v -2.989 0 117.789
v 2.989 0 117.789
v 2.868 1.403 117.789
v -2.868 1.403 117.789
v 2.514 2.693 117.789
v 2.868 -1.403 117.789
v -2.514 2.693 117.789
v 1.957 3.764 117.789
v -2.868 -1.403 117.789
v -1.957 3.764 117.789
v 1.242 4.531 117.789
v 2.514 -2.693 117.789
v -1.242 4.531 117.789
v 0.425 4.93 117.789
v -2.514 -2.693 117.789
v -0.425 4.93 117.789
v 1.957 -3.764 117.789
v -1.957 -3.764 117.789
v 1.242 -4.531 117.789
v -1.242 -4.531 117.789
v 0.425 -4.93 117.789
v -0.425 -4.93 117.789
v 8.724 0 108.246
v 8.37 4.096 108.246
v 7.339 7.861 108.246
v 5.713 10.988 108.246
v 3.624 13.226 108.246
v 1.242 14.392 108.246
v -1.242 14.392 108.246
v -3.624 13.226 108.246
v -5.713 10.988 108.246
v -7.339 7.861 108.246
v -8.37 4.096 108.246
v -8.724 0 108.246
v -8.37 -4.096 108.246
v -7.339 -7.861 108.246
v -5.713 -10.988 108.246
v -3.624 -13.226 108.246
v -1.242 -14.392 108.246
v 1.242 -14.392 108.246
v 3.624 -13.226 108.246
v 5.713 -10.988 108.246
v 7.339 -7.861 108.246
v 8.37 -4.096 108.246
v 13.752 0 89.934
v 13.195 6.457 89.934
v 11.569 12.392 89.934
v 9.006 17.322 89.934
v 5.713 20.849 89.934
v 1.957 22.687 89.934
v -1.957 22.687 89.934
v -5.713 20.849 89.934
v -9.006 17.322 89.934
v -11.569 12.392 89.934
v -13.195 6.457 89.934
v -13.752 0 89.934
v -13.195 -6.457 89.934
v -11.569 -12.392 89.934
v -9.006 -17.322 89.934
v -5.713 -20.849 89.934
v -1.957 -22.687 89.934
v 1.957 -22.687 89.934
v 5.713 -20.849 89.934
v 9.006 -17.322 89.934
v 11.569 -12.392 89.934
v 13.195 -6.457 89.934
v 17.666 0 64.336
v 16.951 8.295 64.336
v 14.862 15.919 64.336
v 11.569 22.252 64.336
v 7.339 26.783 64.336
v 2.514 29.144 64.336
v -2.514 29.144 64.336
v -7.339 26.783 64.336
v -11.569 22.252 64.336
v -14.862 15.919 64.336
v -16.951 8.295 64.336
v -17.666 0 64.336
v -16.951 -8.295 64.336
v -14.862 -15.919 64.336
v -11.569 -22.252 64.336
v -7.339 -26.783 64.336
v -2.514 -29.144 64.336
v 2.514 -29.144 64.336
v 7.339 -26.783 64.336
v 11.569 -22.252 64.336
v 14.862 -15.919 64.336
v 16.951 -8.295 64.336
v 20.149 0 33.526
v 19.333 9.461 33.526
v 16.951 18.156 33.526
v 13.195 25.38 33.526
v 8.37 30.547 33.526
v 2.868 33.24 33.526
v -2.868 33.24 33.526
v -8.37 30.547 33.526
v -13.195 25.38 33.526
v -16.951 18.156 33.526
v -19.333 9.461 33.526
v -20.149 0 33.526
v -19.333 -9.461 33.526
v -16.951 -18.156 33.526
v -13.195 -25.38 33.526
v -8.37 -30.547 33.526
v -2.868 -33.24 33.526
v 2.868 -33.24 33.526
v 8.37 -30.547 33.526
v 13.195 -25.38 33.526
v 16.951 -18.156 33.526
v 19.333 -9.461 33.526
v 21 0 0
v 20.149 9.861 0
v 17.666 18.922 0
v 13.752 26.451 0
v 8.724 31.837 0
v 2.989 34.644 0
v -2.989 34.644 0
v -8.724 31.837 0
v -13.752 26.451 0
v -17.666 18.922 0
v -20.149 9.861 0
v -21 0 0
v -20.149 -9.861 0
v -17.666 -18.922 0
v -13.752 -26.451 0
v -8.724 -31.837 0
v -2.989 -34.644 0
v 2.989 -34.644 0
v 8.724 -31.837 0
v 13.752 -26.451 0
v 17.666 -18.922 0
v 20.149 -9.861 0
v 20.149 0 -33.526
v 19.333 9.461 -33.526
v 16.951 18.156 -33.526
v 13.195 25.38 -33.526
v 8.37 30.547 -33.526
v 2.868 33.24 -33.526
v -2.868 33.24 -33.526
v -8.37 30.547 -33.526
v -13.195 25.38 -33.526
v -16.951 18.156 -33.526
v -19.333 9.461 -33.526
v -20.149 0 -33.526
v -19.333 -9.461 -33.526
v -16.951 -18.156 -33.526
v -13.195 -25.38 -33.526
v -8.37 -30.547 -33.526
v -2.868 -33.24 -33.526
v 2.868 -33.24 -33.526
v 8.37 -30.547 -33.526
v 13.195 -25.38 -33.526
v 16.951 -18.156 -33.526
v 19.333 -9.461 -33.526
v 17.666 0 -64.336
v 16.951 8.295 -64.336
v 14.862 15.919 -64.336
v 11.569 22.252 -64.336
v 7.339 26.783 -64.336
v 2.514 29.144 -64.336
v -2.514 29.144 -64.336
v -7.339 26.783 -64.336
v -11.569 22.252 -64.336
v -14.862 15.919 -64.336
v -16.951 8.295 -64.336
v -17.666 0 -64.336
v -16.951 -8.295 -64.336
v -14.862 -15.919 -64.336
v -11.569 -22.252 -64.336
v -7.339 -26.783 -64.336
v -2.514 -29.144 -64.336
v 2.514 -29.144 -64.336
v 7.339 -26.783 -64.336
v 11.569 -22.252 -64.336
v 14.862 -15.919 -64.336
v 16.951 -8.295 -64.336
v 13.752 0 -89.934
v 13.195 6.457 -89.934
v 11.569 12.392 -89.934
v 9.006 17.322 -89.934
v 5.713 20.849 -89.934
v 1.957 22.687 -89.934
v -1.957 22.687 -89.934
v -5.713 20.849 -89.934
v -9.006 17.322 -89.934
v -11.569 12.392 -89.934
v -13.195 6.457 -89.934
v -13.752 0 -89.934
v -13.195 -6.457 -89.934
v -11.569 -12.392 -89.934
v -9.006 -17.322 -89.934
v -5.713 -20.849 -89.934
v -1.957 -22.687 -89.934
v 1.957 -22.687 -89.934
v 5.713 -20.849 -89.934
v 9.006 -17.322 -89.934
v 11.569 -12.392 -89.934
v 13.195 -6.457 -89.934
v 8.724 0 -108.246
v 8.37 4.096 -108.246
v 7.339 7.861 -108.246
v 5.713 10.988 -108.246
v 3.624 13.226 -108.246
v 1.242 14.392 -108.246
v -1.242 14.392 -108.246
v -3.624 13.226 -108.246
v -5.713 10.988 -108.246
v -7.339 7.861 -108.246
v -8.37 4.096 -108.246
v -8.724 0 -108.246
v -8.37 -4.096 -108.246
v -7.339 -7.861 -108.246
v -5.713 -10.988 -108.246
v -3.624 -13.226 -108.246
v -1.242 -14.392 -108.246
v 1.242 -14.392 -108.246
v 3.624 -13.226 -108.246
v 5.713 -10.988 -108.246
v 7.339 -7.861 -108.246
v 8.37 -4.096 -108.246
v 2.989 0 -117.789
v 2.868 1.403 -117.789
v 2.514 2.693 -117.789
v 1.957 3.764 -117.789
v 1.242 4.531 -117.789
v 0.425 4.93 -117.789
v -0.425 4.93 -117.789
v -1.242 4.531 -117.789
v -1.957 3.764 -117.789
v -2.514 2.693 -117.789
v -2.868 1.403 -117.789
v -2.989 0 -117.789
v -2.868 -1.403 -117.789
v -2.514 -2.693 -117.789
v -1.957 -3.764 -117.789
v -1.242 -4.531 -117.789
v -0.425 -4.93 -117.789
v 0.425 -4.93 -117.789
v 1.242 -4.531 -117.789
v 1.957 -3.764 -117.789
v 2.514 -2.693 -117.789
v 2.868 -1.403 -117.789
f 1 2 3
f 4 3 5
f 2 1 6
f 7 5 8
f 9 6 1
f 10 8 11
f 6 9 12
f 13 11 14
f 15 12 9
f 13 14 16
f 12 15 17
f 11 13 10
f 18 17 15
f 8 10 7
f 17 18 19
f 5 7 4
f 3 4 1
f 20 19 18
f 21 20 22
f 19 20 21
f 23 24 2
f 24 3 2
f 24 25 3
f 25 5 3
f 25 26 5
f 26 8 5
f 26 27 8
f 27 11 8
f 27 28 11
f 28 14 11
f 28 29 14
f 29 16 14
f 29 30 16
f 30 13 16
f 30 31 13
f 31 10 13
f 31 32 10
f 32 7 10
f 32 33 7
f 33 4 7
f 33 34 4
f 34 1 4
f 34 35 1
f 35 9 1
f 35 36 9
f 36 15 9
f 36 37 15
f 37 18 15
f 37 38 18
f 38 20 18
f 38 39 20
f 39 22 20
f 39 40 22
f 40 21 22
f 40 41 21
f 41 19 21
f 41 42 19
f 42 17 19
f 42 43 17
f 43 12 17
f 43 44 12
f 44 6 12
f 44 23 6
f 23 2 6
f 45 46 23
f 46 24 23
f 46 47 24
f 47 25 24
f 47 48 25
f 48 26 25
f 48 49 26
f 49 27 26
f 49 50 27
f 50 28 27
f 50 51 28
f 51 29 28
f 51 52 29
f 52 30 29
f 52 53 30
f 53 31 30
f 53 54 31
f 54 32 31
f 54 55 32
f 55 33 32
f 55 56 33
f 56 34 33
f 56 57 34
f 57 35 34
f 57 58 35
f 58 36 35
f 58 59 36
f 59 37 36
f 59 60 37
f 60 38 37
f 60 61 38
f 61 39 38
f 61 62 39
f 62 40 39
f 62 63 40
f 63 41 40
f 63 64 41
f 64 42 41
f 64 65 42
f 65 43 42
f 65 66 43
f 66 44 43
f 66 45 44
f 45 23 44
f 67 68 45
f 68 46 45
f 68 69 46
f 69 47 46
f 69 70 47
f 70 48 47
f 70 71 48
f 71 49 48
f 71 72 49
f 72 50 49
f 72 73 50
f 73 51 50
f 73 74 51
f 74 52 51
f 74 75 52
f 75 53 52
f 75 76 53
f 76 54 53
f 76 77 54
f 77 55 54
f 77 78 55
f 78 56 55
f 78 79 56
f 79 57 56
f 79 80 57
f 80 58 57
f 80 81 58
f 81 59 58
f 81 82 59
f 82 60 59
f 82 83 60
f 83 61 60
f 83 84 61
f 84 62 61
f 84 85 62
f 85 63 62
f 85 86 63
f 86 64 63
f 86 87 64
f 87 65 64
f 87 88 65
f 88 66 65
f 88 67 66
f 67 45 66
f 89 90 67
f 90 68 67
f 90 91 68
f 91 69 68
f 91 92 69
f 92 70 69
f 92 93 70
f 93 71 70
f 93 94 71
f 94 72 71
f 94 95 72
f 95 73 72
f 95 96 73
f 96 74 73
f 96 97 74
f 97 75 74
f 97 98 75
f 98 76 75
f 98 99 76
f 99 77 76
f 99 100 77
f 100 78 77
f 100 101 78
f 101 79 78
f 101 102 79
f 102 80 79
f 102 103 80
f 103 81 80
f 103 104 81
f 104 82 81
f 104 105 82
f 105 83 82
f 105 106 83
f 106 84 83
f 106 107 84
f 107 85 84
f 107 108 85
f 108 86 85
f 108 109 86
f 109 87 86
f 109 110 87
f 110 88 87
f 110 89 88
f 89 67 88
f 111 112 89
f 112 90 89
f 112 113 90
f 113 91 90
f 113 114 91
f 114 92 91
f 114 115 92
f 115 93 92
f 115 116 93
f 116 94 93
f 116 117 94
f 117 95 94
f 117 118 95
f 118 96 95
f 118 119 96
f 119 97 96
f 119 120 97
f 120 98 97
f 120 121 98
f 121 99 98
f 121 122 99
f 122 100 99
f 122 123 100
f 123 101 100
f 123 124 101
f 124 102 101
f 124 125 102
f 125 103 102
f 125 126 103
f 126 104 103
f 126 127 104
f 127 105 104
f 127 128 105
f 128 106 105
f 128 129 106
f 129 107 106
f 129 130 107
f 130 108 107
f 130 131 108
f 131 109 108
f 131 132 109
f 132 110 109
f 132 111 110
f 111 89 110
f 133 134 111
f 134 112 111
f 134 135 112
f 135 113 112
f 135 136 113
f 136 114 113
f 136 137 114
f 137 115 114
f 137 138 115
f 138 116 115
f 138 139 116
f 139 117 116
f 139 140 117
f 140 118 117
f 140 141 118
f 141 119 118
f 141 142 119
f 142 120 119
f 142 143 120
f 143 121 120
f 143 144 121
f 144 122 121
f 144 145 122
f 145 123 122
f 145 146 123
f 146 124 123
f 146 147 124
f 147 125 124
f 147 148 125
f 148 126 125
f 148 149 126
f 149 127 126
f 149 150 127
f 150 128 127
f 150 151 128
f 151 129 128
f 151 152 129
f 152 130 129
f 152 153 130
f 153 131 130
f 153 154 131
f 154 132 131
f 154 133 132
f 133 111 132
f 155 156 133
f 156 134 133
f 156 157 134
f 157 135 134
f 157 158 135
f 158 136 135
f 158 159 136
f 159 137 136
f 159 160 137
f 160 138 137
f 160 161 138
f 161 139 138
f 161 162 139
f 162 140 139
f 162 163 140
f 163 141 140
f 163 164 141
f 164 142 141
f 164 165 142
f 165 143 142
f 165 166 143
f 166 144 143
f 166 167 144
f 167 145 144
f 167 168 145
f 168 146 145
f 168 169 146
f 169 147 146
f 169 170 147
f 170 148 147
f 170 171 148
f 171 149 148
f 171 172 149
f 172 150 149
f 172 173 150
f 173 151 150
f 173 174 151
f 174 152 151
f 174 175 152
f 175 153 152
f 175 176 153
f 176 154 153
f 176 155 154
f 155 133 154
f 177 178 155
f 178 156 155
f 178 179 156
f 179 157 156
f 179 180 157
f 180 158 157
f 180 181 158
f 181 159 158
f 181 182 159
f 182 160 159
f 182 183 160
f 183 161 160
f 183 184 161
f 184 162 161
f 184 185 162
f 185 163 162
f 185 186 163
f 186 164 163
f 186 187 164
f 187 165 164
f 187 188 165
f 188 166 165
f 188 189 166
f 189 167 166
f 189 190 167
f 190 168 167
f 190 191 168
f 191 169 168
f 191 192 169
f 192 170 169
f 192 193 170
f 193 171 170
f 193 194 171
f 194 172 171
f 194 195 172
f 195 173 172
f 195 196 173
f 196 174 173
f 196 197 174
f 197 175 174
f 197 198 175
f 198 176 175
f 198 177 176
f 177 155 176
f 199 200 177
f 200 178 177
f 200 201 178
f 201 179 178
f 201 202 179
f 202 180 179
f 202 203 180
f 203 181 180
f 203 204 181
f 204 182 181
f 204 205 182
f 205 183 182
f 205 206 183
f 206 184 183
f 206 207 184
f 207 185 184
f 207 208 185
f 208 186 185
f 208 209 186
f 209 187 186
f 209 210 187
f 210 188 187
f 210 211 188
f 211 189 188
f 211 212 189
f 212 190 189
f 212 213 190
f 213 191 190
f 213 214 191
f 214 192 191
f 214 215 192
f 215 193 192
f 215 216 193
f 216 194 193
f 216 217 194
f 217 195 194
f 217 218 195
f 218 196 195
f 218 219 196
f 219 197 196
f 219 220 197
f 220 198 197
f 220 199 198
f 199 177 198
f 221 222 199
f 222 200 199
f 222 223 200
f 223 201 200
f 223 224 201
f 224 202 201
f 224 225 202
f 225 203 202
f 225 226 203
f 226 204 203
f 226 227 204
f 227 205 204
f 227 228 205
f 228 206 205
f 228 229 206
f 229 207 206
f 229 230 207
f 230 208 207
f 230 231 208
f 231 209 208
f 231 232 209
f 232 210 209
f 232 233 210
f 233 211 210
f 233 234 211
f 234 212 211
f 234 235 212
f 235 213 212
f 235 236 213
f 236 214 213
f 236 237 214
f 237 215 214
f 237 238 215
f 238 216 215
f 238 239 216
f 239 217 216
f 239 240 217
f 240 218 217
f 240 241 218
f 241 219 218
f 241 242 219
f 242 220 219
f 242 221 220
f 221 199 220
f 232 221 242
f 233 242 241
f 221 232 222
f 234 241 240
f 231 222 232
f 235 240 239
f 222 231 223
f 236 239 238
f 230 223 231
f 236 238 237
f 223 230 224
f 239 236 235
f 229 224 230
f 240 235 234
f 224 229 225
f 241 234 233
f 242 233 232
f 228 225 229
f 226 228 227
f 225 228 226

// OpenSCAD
// Generated by SolidPython 1.0.1 on 2020-07-29 00:46:45


scale(v = [3, 5, 17]) {
	sphere(r = 7);
}
/***********************************************
*********      SolidPython code:      **********
************************************************
 
# import packages: SolidPython
from solid import *
from solid.utils import *
from itertools import chain, combinations, permutations


class Resize:

    def __init__(self, scad_file):
        self.scad_file = scad_file
        #self.scad_file = import_scad(scad_file)
        # cone/cylinder param:
        self.r1 = 0
        self.r2 = 0
        self.h = 0
        # rectangular prism param:
        self.w = 0
        self.l = 0
        # ellipse param:
        self.r = 0

    # import OpenScad code (file name corresponds to shape)


    # classify shape + parameters
    def assign(self, param1, param2, param3):
        if self.scad_file == 'cone.scad':
            self.r1 = param1
            self.r2 = param2
            self.h = param3
        elif self.scad_file == 'cylinder.scad':
            self.r1 = param1
            self.r2 = param2
            self.h = param3
        elif self.scad_file == 'rectangularPrism.scad':
            self.h = param1
            self.l = param2
            self.w = param3
        else:
            self.r = param1
            self.h = param2

    # resize parameters
    def iterate(self):
        x = range(3, 20, 2)
        i = 1
        if self.scad_file == 'cone.scad':
            tempList = list(permutations(x, 2))
            for temp in tempList:
                param1 = temp[0]
                param2 = temp[1]
                filepath = 'produced_scad_files/' + 'cone' + str(param1) + '_' + str(param2) + '_' + '.scad'
                scad_render_to_file(cylinder(h=param1, r1=param2, r2=0), filepath)

        elif self.scad_file == 'cylinder.scad':
            tempList = list(permutations(x, 3))
            for temp in tempList:
                param1 = temp[0]
                param2 = temp[1]
                filepath = 'produced_scad_files/' + 'cylinder' + str(param1) + '_' + str(param2) + '_' + '.scad'
                scad_render_to_file(cylinder(h=param1, r1=param2, r2=param2), filepath)

        elif self.scad_file == 'rectangularPrism.scad':
            tempList = list(permutations(x, 3))
            for temp in tempList:
                param1 = temp[0]
                param2 = temp[1]
                param3 = temp[2]
                filepath = 'produced_scad_files/' + 'rectangularPrism' + str(param1) + '_' + str(param2) + '_' + str(
                    param3) + '.scad'
                scad_render_to_file(cube(size=(param1, param2, param3)), filepath)

        elif self.scad_file == 'ellipse.scad':
            tempList = list(permutations(x, 4))
            for temp in tempList:
                param1 = temp[0]
                param2 = temp[1]
                param3 = temp[2]
                param4 = temp[3]
                filepath = 'produced_scad_files/' + 'ellipse' + str(param1) + '_' + str(param2) + '_' + str(param3) + '_' + str(param4) + '.scad'
                scad_render_to_file(scale([param1, param2, param3])(sphere(r=param4)), filepath)

    def render_to_scadfile(self):
        scad_render_to_file(scad, 'example.scad') 
 
************************************************/
